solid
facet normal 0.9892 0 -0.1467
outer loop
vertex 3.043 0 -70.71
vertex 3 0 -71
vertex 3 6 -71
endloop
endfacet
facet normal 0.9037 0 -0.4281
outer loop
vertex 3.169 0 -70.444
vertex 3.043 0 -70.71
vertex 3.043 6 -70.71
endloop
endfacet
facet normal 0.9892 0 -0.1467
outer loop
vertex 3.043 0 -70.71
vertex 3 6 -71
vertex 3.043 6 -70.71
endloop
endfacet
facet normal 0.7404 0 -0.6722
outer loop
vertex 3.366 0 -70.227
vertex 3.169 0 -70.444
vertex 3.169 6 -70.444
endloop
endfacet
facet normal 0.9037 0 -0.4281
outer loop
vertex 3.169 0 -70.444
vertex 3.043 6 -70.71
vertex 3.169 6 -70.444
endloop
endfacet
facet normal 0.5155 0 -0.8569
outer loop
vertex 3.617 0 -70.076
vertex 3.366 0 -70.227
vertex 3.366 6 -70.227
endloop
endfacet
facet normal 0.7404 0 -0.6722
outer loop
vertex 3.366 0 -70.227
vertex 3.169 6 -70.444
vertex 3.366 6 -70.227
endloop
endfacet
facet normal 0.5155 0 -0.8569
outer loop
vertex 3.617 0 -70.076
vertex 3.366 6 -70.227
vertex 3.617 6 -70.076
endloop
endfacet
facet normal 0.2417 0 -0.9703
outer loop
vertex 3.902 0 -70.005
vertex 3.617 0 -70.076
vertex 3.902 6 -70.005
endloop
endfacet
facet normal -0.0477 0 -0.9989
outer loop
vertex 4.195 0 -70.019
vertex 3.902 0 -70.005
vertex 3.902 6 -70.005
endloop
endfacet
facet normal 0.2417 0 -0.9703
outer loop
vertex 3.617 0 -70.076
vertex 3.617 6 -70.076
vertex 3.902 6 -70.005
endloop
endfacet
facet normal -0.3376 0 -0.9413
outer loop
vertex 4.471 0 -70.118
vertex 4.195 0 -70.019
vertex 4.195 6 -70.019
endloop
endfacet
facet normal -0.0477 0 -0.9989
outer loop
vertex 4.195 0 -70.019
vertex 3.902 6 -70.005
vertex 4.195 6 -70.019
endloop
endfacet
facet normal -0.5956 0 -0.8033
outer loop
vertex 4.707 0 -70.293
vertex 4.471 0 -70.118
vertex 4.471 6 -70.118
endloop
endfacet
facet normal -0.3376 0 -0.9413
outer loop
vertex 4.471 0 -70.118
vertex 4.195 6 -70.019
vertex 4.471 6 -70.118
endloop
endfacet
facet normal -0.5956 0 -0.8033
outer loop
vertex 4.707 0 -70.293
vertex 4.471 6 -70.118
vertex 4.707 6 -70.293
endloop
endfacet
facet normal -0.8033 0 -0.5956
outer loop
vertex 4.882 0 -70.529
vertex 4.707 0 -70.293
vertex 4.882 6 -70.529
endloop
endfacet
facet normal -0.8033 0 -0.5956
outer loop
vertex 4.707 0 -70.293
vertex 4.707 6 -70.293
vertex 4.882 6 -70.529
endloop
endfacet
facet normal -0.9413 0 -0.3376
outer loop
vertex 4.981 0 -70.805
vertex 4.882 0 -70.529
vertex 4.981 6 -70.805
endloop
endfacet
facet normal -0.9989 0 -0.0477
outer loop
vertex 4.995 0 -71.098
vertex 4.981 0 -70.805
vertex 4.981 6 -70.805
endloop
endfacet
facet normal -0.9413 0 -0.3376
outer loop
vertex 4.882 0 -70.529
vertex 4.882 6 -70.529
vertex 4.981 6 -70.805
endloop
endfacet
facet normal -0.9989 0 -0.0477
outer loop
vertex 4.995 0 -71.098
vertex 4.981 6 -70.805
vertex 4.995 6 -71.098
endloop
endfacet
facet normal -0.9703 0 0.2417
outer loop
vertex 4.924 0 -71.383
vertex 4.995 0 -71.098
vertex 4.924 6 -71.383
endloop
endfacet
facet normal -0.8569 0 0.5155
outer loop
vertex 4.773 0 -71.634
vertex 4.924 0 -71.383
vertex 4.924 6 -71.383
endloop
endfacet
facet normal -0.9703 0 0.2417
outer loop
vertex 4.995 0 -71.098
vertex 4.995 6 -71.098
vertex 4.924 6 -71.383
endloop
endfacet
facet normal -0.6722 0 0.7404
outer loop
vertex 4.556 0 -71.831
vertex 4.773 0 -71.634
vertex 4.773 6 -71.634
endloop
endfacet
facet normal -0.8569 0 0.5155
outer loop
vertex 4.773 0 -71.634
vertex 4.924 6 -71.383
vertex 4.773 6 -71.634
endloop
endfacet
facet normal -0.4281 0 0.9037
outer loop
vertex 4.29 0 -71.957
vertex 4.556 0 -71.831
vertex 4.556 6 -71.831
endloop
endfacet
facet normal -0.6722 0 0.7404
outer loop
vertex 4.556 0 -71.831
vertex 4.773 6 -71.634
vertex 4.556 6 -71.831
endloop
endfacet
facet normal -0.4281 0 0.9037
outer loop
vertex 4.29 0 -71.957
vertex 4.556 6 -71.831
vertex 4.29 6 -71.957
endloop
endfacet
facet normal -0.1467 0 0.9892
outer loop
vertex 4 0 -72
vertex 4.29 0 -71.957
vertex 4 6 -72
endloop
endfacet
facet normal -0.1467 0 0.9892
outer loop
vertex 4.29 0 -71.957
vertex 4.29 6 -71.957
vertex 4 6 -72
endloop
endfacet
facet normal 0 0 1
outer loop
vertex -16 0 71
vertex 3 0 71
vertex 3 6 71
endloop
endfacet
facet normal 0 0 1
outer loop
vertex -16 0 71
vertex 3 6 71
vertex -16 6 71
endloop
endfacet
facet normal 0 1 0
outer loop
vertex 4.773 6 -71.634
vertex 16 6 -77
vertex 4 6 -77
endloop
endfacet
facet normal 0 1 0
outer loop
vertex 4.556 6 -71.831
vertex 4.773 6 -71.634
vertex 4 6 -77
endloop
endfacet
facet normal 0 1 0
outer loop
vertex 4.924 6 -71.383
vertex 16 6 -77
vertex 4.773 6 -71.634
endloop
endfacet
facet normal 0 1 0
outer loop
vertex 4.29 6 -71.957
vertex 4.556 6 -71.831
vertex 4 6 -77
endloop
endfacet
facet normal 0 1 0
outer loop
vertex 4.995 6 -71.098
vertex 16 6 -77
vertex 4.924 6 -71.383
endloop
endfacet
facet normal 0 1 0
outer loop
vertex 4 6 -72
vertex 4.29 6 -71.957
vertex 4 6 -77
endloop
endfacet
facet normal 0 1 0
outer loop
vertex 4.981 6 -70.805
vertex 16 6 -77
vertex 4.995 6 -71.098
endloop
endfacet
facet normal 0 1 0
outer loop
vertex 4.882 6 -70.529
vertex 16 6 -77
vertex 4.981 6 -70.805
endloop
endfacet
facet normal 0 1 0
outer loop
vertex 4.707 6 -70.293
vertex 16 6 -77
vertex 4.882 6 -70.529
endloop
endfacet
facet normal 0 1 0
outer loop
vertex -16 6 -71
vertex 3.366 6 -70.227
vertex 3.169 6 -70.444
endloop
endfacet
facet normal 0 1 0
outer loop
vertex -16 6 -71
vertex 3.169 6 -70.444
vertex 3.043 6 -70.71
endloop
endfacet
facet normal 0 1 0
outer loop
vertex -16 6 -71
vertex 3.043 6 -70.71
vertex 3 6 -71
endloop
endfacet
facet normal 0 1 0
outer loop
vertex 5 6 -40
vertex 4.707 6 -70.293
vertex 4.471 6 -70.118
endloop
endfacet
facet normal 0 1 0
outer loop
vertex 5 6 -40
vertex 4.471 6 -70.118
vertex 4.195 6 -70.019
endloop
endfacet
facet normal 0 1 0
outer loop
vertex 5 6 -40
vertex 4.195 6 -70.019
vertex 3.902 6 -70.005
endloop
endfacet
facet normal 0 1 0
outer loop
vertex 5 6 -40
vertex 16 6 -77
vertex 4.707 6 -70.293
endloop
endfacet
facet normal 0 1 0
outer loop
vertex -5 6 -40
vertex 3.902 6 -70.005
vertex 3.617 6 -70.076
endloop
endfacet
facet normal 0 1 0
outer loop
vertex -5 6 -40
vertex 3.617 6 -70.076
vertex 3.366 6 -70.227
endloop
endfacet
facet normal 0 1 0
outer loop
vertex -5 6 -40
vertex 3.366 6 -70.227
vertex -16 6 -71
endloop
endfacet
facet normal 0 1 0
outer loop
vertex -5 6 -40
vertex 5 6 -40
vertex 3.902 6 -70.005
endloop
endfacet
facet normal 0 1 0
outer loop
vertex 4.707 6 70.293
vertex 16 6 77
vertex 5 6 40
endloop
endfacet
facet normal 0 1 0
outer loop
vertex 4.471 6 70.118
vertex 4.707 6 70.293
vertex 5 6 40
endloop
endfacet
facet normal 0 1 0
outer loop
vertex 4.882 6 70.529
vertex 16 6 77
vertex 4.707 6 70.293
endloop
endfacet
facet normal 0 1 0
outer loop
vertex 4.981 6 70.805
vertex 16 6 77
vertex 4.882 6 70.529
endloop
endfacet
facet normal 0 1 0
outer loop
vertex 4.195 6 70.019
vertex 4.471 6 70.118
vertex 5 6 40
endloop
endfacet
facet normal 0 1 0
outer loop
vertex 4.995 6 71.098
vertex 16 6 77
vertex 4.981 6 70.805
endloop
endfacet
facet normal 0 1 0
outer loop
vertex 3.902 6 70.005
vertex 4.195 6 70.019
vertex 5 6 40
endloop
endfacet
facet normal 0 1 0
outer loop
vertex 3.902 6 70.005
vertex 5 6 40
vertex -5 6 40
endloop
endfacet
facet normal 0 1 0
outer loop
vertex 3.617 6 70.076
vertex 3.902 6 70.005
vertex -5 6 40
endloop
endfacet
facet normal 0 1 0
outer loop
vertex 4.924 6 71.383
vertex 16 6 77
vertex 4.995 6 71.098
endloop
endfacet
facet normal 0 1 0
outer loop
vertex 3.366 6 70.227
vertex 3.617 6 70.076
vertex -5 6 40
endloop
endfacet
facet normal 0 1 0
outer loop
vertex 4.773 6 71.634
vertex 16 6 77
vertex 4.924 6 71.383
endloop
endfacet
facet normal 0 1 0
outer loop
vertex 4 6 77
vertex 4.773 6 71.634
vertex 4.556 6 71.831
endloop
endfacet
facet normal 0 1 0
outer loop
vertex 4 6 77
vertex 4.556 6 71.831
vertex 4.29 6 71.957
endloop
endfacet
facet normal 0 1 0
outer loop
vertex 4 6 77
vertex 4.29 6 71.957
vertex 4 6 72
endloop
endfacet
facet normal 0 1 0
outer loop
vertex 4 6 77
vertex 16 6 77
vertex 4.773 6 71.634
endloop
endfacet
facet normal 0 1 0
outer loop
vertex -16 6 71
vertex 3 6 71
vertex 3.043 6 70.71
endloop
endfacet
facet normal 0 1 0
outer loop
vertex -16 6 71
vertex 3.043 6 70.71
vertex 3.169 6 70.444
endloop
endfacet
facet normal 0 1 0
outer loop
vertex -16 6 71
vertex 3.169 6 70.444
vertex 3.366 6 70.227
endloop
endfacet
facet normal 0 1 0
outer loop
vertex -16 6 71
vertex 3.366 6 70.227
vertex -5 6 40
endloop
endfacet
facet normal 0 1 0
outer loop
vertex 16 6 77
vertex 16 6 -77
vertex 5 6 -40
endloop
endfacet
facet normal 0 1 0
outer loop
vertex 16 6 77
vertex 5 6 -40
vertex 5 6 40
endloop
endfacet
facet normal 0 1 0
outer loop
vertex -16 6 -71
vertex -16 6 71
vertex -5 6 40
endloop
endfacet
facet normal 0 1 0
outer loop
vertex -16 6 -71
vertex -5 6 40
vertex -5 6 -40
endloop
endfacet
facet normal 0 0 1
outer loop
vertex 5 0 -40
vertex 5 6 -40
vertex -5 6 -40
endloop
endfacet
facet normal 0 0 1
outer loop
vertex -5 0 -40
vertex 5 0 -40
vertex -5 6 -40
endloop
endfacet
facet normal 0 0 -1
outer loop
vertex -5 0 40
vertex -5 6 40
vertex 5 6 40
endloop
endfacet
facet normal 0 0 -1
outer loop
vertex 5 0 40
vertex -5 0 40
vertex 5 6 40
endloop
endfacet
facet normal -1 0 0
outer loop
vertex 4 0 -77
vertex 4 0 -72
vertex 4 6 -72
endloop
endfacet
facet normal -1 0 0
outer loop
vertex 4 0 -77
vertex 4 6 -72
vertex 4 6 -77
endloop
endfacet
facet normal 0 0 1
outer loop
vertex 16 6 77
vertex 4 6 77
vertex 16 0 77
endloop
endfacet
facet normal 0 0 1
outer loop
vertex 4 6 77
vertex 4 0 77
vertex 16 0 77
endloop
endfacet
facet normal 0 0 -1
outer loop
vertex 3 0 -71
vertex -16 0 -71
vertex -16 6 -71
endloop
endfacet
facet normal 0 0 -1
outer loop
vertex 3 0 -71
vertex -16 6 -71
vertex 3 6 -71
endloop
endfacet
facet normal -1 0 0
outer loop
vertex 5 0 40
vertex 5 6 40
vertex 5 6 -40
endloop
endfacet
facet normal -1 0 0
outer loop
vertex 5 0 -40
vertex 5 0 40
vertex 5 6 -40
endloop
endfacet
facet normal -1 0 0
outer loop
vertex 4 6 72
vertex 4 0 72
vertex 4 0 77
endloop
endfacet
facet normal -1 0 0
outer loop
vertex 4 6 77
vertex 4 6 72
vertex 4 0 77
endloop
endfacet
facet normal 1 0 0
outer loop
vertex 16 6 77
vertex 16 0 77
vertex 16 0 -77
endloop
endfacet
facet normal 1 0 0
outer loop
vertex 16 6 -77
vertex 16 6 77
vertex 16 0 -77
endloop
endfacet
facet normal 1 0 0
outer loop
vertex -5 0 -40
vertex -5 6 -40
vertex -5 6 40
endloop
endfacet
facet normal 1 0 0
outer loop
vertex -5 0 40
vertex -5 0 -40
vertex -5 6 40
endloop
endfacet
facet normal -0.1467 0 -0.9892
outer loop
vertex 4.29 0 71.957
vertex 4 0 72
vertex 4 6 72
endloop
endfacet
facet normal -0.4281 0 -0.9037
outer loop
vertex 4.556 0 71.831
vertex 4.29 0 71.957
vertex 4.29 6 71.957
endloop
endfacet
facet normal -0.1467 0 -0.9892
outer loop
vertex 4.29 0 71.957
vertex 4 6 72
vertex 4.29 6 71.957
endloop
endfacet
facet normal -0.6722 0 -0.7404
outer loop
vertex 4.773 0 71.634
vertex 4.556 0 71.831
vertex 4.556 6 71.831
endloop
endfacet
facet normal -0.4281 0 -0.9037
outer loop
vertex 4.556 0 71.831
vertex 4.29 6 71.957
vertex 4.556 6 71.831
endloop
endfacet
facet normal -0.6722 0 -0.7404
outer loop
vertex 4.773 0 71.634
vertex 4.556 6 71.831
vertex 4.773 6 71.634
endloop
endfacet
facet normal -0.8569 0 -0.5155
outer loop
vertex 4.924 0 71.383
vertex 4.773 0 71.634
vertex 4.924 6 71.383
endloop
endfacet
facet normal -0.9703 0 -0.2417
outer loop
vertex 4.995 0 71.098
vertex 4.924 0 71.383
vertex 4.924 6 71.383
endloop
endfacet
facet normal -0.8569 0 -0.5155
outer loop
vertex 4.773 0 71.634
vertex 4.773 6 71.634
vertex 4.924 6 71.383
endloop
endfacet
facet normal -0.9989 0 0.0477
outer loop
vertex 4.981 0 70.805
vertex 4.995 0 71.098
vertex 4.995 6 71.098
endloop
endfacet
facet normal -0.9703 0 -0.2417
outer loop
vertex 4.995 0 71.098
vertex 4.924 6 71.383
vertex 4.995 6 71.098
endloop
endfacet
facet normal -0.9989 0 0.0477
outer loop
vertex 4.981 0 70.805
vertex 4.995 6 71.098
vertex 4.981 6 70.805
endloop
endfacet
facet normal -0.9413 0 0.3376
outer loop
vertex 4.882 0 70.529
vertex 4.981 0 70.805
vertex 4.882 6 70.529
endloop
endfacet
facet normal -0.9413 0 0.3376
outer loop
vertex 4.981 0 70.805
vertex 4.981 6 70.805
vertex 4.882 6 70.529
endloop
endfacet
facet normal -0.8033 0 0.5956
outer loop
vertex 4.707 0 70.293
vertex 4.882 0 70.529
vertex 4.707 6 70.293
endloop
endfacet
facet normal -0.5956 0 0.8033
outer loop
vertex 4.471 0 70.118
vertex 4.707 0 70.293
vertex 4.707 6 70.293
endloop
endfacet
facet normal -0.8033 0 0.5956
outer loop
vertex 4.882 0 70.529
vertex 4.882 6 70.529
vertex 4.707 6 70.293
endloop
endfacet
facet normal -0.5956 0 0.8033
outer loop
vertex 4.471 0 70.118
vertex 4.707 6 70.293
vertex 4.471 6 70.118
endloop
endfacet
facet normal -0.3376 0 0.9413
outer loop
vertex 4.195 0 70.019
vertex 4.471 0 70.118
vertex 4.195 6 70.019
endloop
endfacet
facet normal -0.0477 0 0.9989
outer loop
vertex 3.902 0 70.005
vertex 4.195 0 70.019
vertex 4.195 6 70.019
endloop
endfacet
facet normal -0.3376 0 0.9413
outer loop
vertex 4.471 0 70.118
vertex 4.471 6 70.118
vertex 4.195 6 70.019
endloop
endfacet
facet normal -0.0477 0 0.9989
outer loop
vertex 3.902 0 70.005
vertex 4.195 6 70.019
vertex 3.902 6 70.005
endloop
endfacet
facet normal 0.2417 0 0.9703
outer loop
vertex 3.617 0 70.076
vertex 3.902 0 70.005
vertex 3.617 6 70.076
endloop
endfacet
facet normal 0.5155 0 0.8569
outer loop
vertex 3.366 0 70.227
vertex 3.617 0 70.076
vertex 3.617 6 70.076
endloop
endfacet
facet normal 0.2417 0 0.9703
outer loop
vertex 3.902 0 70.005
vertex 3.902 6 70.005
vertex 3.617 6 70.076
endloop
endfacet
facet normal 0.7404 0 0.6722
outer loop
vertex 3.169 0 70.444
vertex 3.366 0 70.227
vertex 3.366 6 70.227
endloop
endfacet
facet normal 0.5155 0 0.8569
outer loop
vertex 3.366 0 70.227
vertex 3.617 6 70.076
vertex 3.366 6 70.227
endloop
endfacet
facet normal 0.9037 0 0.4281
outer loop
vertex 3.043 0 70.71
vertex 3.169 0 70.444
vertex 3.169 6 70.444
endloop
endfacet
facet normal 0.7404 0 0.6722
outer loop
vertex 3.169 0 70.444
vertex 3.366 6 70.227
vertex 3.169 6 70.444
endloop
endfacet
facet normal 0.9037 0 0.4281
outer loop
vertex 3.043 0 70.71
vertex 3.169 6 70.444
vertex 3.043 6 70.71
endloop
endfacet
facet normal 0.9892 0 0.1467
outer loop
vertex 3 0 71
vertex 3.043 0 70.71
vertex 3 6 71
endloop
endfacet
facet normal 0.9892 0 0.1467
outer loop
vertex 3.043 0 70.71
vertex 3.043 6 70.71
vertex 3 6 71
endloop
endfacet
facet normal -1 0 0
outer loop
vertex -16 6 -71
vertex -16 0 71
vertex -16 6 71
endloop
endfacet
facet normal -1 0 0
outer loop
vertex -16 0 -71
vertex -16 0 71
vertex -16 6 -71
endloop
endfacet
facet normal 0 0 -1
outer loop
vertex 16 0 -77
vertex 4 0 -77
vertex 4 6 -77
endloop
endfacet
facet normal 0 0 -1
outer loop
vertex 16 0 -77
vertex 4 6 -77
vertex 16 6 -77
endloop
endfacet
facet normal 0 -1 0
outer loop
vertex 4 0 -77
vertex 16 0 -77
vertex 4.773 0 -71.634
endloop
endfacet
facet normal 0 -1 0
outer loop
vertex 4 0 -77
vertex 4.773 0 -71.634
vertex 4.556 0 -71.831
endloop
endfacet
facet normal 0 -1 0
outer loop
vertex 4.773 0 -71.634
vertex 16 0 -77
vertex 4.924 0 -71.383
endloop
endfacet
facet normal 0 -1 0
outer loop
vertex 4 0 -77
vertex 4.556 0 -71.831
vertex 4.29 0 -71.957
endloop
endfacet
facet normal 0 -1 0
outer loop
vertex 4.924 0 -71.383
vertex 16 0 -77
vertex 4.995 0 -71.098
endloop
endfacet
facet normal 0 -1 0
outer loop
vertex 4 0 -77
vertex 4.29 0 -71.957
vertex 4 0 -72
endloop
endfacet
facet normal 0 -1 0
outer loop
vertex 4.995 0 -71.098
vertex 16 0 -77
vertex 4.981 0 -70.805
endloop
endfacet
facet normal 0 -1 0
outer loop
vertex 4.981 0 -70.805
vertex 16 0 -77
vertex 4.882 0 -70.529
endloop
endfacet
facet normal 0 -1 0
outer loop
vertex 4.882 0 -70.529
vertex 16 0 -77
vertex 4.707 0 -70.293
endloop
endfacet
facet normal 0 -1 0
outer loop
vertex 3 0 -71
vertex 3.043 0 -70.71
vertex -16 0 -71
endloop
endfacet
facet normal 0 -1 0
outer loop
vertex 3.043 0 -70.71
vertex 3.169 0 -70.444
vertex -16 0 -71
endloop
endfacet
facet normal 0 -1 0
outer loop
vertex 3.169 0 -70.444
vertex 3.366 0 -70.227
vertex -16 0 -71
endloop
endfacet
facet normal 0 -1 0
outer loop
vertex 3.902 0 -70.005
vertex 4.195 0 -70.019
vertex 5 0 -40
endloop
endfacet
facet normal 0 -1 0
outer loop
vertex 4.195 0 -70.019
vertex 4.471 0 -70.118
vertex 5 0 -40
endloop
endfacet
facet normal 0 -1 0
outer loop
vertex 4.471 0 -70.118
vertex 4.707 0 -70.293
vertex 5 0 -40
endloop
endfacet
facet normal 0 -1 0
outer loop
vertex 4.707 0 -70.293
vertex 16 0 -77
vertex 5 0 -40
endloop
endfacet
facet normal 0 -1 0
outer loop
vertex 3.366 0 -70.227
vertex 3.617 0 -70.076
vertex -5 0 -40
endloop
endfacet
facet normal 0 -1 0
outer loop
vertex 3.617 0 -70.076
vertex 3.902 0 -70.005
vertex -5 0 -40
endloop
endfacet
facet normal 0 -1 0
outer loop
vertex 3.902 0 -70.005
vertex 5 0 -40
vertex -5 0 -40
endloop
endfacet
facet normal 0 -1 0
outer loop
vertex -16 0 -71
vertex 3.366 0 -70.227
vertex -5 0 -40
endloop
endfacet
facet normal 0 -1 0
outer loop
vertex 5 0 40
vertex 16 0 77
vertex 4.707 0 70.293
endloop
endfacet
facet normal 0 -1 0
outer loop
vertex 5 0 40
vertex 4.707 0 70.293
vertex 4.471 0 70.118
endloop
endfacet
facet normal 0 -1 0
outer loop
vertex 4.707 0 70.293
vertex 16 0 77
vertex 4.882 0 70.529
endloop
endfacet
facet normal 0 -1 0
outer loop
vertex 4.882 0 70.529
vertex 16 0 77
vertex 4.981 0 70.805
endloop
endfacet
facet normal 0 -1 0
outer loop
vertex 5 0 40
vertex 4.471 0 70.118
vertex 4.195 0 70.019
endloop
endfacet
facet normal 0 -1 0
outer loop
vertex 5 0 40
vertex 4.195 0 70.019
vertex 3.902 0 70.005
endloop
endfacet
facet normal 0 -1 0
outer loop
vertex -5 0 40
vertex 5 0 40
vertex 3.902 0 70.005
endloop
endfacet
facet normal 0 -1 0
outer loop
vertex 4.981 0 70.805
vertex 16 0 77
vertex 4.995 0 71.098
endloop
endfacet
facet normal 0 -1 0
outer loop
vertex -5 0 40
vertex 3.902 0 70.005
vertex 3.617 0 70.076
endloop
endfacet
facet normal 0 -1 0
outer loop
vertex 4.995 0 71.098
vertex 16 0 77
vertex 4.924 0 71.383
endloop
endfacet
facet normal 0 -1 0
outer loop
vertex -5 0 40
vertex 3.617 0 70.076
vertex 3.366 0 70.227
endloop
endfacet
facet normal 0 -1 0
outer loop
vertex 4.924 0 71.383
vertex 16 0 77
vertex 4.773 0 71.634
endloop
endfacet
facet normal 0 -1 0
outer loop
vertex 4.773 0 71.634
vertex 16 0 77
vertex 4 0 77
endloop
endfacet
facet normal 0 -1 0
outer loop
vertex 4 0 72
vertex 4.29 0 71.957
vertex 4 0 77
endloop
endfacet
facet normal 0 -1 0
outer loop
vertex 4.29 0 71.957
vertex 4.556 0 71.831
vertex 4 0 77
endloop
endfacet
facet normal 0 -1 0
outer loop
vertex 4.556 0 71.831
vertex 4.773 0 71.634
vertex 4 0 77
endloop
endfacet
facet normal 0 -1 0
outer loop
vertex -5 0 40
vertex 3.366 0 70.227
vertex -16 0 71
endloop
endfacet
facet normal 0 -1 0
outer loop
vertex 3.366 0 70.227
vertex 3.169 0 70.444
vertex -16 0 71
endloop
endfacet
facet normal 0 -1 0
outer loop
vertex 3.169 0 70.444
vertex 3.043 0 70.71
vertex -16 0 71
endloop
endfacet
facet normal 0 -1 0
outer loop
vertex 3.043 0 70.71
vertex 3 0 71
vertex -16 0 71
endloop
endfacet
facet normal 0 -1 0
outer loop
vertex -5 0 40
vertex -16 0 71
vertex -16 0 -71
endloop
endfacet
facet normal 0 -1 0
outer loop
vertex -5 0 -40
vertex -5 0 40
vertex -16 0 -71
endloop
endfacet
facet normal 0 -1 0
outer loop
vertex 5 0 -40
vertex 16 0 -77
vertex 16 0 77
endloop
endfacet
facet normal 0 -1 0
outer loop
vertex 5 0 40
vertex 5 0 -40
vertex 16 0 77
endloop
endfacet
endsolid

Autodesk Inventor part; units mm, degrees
ref_plane "우측면도" through (0, 0, 0) normal (1, 0, 0) x (0, 1, 0)
ref_plane "평면도" through (0, 0, 0) normal (0, 1, 0) x (-1, 0, 0)
ref_plane "정면도" through (0, 0, 0) normal (0, 0, 1) x (1, 0, 0)
sketch "스케치1" plane through (0, 0, 0) normal (0, 1, 0) x (-1, 0, 0)
  line L0 (-16, 71) -> (16, 71)
  line L1 (16, 71) -> (16, -71)
  line L2 (16, -71) -> (-16, -71)
  line L3 (-16, -71) -> (-16, 71)
  line L4 (-16, 71) -> (16, -71) construction
  line L5 (16, 71) -> (-16, -71) construction
  line L6 (-16, -71) -> (-4, -71)
  line L7 (-4, -71) -> (-4, -77)
  line L8 (-4, -77) -> (-16, -77)
  line L9 (-16, -77) -> (-16, -71)
  line L10 (-16, 71) -> (-4, 71)
  line L11 (-4, 71) -> (-4, 77)
  line L12 (-4, 77) -> (-16, 77)
  line L13 (-16, 77) -> (-16, 71)
  point P0 (0, 0)
  dimension "d0" = 32
  dimension "d1" = 142
  dimension "d2" = 12
  dimension "d3" = 6
  dimension "d4" = 12
  dimension "d5" = 6
extrude "돌출1" add sketch "스케치1" along normal blind 6
sketch "스케치2" plane through (0, 6, 0) normal (0, 1, 0) x (1, 0, 0)
  line L0 (-5, -40) -> (5, -40)
  line L1 (5, -40) -> (5, 40)
  line L2 (5, 40) -> (-5, 40)
  line L3 (-5, 40) -> (-5, -40)
  line L4 (-5, -40) -> (5, 40) construction
  line L5 (5, -40) -> (-5, 40) construction
  point P0 (0, 0)
  dimension "d8" = 10
  dimension "d9" = 80
extrude "돌출2" cut sketch "스케치2" against normal blind 6
sketch "스케치3" plane through (0, 6, 0) normal (0, 1, 0) x (1, 0, 0)
  line L0 (-5, 40) -> (5, 40) projected
  line L1 (5, 40) -> (5, -40) projected
  line L2 (5, -40) -> (-5, -40) projected
  line L3 (-5, -40) -> (-5, 40) projected
  line L4 (-16, -71) -> (4, -71) projected
  line L5 (4, -71) -> (4, -77) projected
  line L6 (4, -77) -> (16, -77) projected
  line L7 (16, -77) -> (16, 77) projected
  line L8 (16, 77) -> (4, 77) projected
  line L9 (4, 77) -> (4, 71) projected
  line L10 (4, 71) -> (-16, 71) projected
  line L11 (-16, 71) -> (-16, -71) projected
  circle A0 centre (4, -71) radius 1
  circle A1 centre (4, 71) radius 1
  point P0 (0, 0)
  dimension "d12" = 2
  dimension "d13" = 2
extrude "돌출3" cut sketch "스케치3" against normal through all contours A0 L5 L4 | L4 L5 A0 | A1 L9 L10 | L10 L9 A1
properties part number "battery bottomplate" material "PMMA 플라스틱"
